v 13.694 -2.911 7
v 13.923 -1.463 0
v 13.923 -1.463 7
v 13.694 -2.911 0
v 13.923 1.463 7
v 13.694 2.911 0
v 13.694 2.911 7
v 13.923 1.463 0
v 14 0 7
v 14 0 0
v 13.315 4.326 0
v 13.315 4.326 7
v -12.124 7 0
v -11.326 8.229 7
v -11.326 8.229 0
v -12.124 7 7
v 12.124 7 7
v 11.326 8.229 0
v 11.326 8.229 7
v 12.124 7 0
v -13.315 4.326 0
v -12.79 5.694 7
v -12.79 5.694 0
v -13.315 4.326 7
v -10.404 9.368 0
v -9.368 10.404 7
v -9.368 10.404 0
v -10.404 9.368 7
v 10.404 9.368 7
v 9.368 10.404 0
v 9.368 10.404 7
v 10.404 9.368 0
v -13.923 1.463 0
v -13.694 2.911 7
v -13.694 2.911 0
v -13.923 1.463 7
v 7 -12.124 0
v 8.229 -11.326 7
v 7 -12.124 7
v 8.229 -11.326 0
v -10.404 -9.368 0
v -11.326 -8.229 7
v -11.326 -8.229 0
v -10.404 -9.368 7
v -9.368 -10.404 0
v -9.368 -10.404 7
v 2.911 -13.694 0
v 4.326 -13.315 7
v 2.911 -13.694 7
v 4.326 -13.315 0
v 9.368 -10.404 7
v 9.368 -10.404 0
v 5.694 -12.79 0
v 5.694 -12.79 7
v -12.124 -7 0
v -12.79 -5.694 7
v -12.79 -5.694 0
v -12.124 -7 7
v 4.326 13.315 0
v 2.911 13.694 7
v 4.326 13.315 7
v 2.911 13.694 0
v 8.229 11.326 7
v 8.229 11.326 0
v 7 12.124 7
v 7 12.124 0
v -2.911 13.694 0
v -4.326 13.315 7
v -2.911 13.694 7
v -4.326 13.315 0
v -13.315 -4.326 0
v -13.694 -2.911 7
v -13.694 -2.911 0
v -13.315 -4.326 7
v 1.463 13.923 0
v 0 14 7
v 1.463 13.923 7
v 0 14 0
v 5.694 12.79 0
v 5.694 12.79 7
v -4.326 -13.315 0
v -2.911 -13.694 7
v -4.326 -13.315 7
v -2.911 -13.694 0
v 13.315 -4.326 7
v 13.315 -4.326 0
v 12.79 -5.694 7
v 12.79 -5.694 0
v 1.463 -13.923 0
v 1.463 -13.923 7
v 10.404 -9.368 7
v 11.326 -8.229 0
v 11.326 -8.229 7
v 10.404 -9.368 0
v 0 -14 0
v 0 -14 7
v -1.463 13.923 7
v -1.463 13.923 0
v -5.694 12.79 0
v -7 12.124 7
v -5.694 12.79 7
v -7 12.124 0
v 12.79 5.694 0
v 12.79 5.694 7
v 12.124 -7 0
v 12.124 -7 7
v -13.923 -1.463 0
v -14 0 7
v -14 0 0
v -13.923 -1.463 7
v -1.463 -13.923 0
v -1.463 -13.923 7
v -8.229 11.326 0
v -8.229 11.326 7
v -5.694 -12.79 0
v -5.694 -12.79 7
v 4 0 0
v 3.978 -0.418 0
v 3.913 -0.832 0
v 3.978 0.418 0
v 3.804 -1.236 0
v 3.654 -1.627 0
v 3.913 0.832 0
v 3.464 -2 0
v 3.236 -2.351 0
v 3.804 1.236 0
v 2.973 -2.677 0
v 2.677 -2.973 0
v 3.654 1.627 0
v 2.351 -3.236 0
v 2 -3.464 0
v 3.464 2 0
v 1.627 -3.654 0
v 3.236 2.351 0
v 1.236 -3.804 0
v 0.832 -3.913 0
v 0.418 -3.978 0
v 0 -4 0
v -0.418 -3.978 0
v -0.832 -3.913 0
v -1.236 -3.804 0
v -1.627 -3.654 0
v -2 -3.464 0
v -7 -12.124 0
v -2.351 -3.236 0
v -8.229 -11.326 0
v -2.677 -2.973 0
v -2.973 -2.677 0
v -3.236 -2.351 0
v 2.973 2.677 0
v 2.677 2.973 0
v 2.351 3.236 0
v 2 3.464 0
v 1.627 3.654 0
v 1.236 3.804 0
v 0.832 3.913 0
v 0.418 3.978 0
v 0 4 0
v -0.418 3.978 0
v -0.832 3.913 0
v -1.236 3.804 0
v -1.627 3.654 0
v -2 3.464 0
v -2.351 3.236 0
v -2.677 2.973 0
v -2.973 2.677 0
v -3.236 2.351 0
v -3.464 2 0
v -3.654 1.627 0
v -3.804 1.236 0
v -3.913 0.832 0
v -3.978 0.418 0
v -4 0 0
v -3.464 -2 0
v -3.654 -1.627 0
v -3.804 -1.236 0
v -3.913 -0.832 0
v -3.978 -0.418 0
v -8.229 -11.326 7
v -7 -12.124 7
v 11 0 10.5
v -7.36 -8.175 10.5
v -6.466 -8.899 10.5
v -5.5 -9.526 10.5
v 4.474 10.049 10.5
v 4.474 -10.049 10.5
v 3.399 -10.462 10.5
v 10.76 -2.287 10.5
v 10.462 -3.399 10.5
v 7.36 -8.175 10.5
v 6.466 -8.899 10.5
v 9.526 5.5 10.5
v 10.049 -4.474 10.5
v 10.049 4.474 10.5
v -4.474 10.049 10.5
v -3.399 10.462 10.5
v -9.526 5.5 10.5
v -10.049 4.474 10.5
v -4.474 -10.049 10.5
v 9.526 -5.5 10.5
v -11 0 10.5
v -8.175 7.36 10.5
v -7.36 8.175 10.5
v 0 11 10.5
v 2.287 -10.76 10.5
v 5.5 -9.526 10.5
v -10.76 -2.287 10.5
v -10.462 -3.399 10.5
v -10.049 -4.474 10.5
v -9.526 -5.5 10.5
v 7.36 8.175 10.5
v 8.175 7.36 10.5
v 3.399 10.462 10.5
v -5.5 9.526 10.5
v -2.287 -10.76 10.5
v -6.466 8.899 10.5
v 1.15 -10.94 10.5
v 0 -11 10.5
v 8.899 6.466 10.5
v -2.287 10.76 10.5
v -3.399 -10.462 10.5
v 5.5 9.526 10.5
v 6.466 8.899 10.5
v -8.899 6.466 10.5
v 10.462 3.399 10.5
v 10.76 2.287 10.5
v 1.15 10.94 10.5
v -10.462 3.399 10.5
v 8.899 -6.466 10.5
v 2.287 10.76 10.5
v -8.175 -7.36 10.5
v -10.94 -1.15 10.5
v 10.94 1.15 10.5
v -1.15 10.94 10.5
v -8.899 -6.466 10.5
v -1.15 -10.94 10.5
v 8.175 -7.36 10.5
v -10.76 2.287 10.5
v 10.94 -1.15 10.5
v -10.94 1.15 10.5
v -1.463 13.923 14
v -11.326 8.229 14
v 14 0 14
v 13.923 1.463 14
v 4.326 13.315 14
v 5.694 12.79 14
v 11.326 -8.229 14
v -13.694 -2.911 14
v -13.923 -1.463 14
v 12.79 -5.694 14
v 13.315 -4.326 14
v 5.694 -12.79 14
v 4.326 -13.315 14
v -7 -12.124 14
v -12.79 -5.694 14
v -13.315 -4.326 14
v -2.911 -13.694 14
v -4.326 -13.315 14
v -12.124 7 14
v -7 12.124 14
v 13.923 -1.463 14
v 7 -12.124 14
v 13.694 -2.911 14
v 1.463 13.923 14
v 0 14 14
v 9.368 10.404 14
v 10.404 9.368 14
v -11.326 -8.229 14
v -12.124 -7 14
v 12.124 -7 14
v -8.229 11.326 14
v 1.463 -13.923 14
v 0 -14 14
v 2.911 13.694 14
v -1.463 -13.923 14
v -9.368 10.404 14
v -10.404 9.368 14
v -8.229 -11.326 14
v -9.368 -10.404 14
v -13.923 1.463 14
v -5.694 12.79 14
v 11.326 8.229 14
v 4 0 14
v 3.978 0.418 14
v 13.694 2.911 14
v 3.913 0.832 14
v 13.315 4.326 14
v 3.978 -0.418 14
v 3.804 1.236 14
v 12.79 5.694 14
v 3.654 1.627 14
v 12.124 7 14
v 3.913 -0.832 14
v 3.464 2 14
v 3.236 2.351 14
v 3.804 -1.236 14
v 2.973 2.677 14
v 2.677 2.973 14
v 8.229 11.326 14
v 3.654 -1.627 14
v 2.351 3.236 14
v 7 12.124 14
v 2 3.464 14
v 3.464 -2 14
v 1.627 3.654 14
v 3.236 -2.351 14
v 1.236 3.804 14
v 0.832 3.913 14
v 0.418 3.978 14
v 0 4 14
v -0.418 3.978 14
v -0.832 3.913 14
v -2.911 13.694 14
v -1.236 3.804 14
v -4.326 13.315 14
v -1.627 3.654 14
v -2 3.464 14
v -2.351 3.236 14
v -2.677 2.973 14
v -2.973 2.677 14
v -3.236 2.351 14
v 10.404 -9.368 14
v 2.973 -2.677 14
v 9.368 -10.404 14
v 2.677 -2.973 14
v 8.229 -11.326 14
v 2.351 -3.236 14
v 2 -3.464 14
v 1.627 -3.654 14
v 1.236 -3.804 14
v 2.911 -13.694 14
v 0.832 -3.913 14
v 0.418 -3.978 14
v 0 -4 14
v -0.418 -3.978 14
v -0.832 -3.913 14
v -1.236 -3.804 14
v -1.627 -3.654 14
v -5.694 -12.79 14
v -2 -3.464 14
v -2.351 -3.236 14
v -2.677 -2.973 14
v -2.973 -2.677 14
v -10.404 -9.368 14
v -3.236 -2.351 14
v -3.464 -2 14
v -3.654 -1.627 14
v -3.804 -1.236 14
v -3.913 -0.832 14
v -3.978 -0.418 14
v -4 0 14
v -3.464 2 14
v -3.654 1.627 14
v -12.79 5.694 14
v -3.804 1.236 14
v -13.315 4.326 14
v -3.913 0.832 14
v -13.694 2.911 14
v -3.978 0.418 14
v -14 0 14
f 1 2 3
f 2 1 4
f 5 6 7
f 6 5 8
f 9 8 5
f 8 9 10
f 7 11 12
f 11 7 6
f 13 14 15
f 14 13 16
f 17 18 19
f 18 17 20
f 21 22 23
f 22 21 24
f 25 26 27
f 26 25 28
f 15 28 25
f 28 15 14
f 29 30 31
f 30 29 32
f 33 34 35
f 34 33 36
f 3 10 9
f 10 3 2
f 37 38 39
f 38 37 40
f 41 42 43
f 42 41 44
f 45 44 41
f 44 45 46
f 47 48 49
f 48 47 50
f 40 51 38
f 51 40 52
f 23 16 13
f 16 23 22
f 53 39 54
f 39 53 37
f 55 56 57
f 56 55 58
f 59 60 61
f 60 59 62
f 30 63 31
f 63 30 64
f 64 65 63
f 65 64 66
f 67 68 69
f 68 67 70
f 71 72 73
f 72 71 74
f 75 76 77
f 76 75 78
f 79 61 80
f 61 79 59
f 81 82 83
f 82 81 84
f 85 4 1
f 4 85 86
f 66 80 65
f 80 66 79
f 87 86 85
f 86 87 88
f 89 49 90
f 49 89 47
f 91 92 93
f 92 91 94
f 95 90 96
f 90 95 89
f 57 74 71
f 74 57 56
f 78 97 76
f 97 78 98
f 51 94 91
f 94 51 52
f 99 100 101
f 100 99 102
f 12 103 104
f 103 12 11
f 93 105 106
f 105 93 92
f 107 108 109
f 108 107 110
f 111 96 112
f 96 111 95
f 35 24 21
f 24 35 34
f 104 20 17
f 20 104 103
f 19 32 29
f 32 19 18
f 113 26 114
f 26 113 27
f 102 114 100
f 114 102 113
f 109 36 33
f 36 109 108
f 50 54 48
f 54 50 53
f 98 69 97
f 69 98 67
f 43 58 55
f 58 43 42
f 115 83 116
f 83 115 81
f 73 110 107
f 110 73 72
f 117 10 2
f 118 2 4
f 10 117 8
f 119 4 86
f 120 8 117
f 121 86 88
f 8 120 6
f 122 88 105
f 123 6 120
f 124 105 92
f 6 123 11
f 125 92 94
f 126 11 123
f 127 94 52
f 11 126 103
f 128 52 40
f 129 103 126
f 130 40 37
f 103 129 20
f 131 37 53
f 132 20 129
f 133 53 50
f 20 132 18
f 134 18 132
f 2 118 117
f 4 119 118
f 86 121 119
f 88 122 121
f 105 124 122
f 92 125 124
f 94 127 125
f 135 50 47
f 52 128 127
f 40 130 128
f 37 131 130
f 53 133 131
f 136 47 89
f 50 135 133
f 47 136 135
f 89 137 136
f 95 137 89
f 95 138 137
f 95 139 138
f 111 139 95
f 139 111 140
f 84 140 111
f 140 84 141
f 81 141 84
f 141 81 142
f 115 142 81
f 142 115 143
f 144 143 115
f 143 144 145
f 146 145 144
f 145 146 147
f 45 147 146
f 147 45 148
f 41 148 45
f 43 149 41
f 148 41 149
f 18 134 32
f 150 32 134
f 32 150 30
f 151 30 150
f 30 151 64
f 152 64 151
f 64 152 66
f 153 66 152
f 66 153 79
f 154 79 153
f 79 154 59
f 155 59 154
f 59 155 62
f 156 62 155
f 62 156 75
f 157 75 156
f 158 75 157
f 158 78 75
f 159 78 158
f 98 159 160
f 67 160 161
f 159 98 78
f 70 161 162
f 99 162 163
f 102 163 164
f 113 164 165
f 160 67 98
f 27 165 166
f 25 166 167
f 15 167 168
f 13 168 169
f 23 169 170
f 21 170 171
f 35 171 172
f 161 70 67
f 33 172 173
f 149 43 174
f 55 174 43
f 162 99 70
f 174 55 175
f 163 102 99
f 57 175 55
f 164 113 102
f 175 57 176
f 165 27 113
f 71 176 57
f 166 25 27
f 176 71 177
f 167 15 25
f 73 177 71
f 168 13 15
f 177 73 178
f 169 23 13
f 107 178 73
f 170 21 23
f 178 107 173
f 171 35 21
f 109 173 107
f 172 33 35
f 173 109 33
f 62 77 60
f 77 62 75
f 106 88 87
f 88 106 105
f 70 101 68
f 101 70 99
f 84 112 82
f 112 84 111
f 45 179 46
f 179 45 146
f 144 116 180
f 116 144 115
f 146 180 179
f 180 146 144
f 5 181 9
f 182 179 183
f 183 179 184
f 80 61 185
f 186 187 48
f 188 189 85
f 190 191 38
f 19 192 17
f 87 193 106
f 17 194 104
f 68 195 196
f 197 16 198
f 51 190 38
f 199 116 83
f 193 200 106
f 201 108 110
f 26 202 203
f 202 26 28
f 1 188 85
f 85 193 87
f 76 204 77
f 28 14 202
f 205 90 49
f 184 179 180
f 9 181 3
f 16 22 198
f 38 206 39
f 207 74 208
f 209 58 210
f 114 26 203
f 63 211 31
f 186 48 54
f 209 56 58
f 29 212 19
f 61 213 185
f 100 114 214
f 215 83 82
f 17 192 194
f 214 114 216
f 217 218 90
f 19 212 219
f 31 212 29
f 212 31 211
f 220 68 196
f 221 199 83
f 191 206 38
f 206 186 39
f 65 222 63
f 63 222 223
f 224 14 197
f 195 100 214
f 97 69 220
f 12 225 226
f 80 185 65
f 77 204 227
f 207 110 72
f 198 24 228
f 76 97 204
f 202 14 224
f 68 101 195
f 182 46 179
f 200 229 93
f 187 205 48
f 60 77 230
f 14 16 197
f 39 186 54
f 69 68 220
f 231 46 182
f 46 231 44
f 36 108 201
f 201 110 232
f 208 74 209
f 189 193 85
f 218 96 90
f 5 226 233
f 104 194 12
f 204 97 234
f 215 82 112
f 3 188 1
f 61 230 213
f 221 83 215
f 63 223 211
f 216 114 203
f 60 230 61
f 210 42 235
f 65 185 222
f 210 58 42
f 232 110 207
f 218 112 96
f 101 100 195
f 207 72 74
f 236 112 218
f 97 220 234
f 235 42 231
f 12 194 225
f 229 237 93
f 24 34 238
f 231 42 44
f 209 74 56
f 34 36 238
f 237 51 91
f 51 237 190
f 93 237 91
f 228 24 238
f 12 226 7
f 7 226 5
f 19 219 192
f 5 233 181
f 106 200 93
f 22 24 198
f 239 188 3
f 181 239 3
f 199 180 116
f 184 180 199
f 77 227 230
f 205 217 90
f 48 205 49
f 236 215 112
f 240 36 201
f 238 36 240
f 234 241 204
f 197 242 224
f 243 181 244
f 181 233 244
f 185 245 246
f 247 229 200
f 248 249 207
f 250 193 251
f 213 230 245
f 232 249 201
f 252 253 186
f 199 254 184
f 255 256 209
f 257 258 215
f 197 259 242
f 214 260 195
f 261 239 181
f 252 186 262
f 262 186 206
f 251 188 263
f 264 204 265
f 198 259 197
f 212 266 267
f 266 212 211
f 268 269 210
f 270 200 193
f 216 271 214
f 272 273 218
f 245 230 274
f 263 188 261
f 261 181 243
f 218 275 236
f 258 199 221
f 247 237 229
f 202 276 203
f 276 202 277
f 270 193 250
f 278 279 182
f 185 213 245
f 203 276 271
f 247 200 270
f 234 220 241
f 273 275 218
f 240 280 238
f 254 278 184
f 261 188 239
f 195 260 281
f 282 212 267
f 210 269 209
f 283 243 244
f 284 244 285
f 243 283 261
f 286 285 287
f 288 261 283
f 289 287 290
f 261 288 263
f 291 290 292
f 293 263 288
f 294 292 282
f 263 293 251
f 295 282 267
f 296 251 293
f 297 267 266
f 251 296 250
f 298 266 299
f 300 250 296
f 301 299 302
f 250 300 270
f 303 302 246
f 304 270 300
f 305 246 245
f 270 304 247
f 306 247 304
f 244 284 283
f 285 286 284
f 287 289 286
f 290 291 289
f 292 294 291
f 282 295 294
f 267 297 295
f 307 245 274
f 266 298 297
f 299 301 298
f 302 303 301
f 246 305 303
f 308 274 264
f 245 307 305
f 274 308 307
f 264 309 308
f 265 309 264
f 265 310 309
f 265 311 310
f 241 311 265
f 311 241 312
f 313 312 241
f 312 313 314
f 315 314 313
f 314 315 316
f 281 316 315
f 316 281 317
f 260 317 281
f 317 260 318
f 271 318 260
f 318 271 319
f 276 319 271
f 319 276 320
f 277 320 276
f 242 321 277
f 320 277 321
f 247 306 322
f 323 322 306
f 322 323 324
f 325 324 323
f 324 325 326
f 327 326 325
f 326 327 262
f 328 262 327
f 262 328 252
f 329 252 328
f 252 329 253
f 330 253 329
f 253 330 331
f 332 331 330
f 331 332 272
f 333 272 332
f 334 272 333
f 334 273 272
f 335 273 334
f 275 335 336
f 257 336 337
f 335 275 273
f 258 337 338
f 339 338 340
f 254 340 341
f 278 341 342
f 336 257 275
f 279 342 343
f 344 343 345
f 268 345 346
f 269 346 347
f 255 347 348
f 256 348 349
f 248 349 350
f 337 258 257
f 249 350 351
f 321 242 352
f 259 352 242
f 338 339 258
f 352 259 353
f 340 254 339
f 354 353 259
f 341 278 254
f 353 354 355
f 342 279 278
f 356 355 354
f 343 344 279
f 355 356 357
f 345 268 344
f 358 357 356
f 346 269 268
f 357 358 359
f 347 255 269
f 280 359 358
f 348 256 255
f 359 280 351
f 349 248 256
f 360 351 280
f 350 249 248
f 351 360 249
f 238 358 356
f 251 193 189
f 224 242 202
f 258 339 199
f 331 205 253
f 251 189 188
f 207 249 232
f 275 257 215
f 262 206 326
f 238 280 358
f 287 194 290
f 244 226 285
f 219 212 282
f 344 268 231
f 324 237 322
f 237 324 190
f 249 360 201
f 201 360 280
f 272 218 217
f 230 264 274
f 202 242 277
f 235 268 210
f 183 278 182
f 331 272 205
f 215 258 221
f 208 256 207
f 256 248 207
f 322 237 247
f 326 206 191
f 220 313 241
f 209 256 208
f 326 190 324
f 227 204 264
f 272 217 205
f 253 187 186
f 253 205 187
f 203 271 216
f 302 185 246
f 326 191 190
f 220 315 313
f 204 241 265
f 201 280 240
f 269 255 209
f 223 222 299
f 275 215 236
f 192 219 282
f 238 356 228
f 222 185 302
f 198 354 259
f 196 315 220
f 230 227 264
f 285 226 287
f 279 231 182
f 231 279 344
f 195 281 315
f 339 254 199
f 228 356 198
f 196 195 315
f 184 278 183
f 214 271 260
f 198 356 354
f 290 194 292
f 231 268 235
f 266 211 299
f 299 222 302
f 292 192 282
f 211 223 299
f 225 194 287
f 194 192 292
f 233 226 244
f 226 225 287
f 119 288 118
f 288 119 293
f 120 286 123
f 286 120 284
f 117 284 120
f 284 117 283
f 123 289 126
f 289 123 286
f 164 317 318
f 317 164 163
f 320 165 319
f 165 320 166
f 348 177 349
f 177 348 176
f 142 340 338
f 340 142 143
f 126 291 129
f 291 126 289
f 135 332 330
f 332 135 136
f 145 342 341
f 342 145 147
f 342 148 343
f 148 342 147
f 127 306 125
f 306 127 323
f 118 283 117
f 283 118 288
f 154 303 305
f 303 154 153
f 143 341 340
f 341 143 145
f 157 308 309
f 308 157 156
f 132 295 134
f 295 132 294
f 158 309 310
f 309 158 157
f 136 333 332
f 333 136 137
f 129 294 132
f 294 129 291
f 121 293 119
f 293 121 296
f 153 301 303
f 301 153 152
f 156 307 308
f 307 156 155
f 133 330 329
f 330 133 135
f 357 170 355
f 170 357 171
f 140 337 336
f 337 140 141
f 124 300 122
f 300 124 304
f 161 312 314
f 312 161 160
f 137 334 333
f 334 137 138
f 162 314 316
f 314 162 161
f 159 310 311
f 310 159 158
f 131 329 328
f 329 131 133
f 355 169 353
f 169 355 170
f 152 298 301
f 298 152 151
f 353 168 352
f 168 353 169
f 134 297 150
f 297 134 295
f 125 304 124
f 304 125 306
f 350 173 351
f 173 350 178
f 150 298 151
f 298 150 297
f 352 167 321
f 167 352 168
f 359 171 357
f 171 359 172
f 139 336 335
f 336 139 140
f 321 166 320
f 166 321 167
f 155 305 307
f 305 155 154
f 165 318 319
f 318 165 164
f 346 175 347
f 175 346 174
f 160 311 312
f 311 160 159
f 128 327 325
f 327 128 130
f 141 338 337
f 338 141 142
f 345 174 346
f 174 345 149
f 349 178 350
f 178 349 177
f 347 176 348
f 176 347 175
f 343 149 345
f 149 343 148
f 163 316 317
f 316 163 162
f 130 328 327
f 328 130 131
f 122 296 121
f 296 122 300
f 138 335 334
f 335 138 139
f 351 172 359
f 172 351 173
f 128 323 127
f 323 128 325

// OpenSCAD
// V-groove guide wheel.
$fn = 60;
eps = 0.02;
bore_d = 8;
outer_d = 28;
width = 14;
groove_d = outer_d-6;
difference() {
    union() { cylinder(d=outer_d,h=width/2); translate([0,0,width/2]) cylinder(d1=outer_d,d2=groove_d,h=width/4); translate([0,0,3*width/4]) cylinder(d1=groove_d,d2=outer_d,h=width/4); }
    translate([0,0,-eps]) cylinder(d=bore_d,h=width+2*eps);
}
